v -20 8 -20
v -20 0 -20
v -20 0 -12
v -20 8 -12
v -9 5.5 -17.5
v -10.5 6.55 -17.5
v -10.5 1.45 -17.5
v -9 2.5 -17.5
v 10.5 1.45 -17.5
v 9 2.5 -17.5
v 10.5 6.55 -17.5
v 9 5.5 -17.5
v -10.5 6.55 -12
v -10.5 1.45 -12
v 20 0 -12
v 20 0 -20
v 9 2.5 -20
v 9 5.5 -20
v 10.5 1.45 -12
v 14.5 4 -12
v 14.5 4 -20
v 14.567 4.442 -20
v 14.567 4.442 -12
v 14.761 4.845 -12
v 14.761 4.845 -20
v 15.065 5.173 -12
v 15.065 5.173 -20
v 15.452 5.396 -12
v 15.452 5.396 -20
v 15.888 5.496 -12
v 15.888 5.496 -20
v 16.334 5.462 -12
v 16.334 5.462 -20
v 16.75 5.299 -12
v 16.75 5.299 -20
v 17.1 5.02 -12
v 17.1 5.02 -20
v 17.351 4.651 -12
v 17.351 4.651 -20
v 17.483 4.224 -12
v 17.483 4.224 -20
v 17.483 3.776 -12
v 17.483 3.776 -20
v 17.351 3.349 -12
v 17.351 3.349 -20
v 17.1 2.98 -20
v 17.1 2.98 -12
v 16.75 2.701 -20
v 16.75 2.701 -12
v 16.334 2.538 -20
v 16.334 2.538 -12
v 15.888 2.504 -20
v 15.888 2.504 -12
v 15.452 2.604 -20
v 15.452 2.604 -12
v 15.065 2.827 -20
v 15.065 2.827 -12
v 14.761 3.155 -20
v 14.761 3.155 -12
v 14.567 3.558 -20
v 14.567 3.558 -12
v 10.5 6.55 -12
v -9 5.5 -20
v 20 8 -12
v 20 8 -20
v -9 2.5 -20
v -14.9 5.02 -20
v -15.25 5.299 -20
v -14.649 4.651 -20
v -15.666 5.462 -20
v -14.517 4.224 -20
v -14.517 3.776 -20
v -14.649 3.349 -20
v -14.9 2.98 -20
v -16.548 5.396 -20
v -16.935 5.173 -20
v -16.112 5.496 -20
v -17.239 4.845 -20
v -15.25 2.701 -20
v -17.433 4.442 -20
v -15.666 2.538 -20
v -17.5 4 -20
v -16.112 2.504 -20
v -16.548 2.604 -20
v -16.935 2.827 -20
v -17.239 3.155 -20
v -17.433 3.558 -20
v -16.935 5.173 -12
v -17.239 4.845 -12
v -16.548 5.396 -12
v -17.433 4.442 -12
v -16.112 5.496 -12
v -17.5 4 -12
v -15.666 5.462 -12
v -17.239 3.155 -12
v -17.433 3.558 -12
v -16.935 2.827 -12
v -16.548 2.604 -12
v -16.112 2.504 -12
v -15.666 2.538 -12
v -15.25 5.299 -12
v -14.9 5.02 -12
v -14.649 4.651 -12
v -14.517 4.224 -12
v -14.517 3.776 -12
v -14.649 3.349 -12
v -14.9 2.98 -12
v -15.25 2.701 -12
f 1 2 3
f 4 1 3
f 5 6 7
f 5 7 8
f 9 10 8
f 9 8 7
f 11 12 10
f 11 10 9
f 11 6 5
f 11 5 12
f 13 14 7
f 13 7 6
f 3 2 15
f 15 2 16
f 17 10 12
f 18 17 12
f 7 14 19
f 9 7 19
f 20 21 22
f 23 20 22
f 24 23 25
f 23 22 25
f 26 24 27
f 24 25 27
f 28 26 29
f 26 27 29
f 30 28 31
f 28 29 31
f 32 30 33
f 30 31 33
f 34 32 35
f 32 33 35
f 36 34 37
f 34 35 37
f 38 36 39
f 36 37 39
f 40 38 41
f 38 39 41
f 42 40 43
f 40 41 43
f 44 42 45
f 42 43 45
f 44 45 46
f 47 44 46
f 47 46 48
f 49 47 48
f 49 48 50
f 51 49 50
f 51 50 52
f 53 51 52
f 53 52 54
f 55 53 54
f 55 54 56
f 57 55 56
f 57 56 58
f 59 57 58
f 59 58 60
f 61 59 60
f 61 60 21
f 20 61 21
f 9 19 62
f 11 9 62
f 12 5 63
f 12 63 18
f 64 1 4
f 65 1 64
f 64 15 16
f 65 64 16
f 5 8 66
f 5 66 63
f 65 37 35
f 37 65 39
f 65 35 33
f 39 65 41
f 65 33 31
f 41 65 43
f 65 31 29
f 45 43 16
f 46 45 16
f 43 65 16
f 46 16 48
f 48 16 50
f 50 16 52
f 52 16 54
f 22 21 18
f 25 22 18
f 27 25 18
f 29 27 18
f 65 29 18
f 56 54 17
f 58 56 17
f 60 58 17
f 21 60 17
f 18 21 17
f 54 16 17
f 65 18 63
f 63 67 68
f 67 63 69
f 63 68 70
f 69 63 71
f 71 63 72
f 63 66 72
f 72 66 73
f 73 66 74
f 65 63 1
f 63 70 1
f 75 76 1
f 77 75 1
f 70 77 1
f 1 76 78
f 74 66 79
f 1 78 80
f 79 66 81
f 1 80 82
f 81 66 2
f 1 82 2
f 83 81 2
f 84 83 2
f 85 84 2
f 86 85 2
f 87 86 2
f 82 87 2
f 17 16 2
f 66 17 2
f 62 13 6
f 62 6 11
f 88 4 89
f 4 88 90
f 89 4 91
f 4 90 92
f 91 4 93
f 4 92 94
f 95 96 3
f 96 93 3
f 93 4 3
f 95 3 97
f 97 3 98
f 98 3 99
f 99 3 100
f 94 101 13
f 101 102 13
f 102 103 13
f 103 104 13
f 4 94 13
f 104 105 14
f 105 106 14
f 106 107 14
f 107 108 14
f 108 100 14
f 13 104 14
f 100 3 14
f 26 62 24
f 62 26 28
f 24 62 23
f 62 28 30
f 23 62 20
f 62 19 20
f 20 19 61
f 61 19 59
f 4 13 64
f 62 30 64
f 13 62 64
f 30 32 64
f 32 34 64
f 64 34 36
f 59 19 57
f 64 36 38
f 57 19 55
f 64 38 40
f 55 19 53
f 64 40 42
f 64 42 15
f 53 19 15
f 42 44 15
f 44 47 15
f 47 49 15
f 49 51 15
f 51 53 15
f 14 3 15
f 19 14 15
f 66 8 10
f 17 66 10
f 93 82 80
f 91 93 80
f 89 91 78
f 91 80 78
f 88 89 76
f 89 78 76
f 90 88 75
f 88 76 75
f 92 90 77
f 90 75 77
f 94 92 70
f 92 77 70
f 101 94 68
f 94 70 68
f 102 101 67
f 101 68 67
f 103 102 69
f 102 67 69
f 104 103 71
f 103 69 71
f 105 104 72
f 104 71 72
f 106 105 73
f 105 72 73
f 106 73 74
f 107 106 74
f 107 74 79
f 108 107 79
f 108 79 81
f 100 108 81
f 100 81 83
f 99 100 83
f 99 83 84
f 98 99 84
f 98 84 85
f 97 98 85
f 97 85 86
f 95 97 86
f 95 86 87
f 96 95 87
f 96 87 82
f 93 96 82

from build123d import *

# Parameters (mm, degrees)
SKETCH1_W           = 21
SKETCH1_H           = 5.5
BOSS_EXTRUDE1_DEPTH = 8
SKETCH2_W           = 21
SKETCH2_H           = 5.1
CUT_EXTRUDE1_DEPTH  = 5.5
SKETCH4_W           = 18
SKETCH4_H           = 3
CUT_EXTRUDE2_DEPTH  = 5.5
SKETCH5_R           = 1.5
CUT_EXTRUDE3_DEPTH  = 10.5


with BuildPart() as part:
    # Sketch1 → Boss-Extrude1 (new body)
    with BuildSketch(Plane(origin=(0, 0, 0), x_dir=(1, 0, 0), z_dir=(0, 1, 0))):
        Polygon((-20, 20), (-20, 12), (-10.5, 12), (-10.5, 17.5), (10.5, 17.5), (10.5, 12), (20, 12), (20, 20), align=None)
        with Locations((0, 14.75)):
            Rectangle(SKETCH1_W, SKETCH1_H)
    extrude(amount=BOSS_EXTRUDE1_DEPTH)

    # Sketch2 → Cut-Extrude1 (cut)
    with BuildSketch(Plane.XY.offset(-12)):
        with Locations((0, 4)):
            Rectangle(SKETCH2_W, SKETCH2_H)
    extrude(amount=-CUT_EXTRUDE1_DEPTH, mode=Mode.SUBTRACT)

    # Sketch4 → Cut-Extrude2 (cut)
    with BuildSketch(Plane.XY.offset(-17.5)):
        with Locations((0, 4)):
            Rectangle(SKETCH4_W, SKETCH4_H)
    extrude(amount=-CUT_EXTRUDE2_DEPTH, mode=Mode.SUBTRACT)

    # Sketch5 → Cut-Extrude3 (cut)
    with BuildSketch(Plane(origin=(0, 0, -20), x_dir=(-1, 0, 0), z_dir=(0, 0, -1))):
        with Locations((-16, 4)):
            Circle(SKETCH5_R)
        with Locations((16, 4)):
            Circle(SKETCH5_R)
    extrude(amount=-CUT_EXTRUDE3_DEPTH, mode=Mode.SUBTRACT)


solid = part.part
